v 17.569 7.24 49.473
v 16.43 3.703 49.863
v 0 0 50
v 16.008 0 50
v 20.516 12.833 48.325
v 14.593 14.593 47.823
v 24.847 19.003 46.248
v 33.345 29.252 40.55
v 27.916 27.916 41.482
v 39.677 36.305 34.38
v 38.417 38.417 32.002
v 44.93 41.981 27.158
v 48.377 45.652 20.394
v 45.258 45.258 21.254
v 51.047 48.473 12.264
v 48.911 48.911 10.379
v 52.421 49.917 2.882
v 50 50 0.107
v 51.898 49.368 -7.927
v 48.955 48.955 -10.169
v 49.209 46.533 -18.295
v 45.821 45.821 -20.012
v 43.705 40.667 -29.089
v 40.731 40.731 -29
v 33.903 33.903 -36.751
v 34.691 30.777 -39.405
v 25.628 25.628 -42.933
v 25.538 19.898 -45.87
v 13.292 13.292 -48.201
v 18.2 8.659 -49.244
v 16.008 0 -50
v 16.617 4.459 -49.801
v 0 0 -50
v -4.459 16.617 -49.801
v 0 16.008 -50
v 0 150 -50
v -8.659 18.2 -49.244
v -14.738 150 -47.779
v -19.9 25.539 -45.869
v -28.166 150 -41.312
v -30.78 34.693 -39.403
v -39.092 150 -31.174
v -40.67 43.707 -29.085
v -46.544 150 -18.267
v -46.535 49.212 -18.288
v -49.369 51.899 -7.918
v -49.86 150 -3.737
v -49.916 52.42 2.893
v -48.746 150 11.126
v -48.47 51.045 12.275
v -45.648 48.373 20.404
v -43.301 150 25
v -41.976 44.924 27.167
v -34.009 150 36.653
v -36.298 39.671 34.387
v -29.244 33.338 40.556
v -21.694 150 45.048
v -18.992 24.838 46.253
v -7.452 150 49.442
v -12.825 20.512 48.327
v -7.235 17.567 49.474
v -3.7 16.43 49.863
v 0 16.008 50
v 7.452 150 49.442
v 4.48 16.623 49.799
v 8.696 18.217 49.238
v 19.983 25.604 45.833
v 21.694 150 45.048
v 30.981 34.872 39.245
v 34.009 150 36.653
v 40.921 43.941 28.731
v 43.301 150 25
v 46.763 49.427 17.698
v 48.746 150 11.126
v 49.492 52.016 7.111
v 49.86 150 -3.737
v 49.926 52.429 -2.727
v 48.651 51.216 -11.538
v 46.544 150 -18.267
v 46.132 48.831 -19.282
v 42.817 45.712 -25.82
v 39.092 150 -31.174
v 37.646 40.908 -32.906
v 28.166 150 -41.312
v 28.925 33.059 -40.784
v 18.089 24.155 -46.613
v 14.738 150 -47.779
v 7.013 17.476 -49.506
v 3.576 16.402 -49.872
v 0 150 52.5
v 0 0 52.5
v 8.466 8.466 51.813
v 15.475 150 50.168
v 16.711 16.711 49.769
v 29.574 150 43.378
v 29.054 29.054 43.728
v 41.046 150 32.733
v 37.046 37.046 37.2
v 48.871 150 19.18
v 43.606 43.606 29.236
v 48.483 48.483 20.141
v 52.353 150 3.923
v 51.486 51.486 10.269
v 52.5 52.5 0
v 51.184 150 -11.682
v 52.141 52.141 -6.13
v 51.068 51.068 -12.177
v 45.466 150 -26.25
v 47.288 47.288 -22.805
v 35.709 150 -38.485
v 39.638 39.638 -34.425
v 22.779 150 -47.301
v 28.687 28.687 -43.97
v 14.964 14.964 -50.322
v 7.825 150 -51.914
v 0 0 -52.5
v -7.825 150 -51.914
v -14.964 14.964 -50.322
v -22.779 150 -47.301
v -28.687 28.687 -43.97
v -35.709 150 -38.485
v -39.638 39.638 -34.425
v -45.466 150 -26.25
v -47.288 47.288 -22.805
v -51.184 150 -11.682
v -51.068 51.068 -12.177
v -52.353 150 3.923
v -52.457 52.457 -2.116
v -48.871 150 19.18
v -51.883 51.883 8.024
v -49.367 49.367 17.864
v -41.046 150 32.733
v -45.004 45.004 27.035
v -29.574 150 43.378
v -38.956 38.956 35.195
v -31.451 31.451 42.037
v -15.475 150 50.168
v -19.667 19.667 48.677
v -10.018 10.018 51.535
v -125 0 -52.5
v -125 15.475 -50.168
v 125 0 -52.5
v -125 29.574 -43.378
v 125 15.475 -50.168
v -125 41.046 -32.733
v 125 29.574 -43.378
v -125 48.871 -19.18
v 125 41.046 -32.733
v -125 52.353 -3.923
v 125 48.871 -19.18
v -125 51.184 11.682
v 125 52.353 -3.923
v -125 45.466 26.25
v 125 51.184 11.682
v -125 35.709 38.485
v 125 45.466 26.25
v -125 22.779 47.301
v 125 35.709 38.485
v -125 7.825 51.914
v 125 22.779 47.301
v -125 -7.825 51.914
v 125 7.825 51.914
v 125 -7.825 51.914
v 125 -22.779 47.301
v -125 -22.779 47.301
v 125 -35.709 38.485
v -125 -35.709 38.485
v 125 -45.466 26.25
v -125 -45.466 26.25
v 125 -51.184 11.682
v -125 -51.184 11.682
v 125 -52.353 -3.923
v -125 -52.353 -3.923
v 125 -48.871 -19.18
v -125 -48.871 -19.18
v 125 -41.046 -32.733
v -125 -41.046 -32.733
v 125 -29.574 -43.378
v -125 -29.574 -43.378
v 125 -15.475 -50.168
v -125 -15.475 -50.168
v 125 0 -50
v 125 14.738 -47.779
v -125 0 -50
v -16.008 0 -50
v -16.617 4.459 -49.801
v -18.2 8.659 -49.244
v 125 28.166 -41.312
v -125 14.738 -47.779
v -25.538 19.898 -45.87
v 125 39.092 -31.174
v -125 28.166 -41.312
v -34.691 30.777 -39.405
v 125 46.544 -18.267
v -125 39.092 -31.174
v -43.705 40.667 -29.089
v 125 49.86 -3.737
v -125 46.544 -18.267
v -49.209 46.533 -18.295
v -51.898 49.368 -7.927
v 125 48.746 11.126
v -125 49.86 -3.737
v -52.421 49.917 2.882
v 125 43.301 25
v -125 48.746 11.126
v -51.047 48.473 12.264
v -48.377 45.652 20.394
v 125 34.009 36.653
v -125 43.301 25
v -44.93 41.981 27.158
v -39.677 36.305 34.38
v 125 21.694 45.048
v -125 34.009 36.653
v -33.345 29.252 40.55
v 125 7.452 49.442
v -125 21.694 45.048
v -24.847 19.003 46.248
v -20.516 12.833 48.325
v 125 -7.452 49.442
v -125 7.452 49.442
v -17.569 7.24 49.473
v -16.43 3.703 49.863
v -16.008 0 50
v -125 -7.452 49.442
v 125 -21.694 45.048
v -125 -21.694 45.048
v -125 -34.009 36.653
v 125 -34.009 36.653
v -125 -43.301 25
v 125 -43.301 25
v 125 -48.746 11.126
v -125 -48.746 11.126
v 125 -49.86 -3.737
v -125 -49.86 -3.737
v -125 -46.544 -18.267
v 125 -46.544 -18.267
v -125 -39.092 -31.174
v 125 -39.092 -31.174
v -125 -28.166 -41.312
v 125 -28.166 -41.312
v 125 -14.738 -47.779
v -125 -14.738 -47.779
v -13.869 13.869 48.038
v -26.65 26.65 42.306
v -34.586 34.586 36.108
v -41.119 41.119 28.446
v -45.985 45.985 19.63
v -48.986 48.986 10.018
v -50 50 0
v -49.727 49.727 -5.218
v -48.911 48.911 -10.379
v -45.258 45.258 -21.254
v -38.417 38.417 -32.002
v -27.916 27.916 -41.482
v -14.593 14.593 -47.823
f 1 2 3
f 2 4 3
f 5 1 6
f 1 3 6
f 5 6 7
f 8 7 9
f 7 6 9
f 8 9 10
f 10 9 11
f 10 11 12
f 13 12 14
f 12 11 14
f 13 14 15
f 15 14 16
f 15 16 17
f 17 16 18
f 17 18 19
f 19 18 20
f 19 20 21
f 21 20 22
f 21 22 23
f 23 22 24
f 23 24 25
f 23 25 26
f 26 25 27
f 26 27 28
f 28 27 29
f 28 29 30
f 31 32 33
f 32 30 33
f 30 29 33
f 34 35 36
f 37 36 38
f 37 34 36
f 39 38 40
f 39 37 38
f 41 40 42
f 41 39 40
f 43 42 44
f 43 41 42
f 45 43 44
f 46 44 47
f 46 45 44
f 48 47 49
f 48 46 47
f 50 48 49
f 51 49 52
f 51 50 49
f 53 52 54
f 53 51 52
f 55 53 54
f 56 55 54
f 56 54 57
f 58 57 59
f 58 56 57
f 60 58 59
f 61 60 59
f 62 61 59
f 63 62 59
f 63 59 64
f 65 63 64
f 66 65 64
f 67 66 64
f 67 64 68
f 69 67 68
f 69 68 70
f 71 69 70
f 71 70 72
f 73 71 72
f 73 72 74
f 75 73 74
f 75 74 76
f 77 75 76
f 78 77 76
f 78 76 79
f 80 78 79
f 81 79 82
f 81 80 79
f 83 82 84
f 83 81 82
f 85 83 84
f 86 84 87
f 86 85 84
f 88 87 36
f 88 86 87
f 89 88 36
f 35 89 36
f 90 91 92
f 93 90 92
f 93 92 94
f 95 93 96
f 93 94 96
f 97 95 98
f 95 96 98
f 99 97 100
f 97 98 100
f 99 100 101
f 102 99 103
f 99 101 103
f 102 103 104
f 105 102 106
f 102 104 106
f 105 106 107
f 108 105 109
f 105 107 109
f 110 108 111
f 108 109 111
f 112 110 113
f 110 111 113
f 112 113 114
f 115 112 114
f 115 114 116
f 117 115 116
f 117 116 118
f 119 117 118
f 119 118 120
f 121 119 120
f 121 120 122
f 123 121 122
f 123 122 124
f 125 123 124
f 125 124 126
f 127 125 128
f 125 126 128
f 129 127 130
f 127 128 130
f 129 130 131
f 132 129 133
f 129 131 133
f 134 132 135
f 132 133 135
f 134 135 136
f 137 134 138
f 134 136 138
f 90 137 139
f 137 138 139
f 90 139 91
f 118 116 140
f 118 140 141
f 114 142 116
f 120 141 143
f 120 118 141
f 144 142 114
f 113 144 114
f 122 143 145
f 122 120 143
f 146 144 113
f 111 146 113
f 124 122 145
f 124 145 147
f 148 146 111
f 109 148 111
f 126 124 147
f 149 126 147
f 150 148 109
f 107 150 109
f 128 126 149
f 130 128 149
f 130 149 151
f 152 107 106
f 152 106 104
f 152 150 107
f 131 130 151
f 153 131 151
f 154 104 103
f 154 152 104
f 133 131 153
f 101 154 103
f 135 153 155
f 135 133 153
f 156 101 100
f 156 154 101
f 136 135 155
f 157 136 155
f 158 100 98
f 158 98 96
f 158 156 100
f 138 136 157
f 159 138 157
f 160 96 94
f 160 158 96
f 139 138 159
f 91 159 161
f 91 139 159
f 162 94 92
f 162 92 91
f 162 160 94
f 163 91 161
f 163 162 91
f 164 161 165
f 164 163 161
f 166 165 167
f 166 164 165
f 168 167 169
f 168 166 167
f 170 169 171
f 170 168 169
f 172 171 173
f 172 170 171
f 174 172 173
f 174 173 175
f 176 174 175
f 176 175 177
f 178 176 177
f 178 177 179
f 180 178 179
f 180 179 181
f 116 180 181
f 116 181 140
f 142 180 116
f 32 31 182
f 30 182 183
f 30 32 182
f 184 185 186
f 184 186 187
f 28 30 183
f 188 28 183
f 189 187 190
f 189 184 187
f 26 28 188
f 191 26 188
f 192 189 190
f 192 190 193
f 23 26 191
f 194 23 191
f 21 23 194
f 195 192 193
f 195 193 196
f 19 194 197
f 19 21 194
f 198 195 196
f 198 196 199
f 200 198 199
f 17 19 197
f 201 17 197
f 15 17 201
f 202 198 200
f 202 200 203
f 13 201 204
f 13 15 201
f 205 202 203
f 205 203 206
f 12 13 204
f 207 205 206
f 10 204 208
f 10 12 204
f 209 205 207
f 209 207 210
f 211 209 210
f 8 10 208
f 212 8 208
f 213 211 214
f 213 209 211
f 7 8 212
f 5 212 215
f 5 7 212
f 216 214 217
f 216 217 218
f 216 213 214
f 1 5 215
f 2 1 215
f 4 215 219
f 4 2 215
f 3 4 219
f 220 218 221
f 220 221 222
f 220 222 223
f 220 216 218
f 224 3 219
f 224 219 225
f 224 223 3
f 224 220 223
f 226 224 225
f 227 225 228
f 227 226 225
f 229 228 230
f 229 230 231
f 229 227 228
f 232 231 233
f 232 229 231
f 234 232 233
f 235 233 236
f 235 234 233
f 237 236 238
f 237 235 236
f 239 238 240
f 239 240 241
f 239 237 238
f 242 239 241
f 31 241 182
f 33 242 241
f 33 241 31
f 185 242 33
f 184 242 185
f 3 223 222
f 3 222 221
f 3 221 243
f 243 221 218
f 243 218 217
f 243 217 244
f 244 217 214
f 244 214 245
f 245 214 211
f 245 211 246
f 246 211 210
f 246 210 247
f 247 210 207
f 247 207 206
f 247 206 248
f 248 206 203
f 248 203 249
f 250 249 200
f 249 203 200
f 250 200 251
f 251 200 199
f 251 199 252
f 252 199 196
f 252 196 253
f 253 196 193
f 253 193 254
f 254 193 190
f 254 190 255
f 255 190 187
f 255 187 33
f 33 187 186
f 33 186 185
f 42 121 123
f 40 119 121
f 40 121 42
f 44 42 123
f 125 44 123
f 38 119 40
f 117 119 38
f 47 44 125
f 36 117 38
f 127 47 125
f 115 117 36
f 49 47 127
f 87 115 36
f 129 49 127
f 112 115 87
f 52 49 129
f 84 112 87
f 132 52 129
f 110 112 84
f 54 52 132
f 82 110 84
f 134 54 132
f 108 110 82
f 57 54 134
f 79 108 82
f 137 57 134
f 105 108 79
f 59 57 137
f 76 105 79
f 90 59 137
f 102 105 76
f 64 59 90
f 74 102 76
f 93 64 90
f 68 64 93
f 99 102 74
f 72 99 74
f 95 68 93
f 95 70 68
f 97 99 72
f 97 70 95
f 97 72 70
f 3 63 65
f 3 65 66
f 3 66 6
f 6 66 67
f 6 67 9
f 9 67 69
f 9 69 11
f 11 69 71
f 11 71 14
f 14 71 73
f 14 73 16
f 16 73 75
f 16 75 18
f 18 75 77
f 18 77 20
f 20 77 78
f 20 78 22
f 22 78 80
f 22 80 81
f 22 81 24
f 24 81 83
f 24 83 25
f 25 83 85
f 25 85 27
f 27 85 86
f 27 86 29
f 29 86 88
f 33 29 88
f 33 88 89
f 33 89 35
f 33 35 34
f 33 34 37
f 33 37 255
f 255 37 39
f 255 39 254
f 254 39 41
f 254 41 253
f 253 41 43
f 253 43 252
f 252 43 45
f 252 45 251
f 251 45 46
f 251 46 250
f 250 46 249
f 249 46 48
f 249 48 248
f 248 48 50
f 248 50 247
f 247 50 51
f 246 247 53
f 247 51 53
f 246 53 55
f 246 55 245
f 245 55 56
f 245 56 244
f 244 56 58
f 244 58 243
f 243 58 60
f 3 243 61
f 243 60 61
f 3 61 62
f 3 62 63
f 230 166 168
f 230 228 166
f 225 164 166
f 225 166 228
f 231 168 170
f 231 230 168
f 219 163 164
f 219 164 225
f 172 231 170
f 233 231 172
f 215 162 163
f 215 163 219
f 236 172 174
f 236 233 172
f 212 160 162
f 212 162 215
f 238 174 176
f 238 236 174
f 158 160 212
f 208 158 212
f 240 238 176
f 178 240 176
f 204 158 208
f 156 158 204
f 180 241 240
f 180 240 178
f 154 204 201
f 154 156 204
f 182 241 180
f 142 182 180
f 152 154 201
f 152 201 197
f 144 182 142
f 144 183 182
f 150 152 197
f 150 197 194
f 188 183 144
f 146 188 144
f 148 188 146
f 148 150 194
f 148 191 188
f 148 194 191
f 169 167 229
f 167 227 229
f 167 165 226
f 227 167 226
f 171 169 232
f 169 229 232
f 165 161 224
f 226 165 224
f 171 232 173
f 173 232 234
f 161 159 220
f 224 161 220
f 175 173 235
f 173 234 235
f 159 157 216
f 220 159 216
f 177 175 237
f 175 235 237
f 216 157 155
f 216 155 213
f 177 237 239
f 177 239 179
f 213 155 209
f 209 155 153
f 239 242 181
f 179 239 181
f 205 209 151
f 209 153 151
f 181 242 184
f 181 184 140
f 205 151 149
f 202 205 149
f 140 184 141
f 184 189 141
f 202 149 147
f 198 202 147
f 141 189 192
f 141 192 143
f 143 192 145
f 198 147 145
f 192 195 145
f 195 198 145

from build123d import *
from build123d.topology import SkipClean

# Parameters (mm, degrees)
SKETCH1_R           = 52.5
SKETCH1_R_2         = 50
BOSS_EXTRUDE1_DEPTH = 125
SKETCH2_R           = 52.5
SKETCH2_R_2         = 50
BOSS_EXTRUDE2_DEPTH = 150
CUT_EXTRUDE1_REACH  = 245.696
SKETCH3_R           = 50
SKETCH6_R           = 50
CUT_EXTRUDE2_DEPTH  = 297.236814188


with BuildPart() as part:
    # Sketch1 → Boss-Extrude1 (new, symmetric)
    with BuildSketch(Plane(origin=(0, 0, 0), x_dir=(0, 0, -1), z_dir=(1, 0, 0))):
        Circle(SKETCH1_R)
        Circle(SKETCH1_R_2, mode=Mode.SUBTRACT)
    extrude(amount=BOSS_EXTRUDE1_DEPTH, both=True)

    # Sketch2 → Boss-Extrude2 (add)
    with BuildSketch(Plane(origin=(0, 0, 0), x_dir=(1, 0, 0), z_dir=(0, 1, 0))):
        with Locations(Location((0, 0, 0), (0, 0, 270))):
            Circle(SKETCH2_R)
        with Locations(Location((0, 0, 0), (0, 0, 90))):
            Circle(SKETCH2_R_2, mode=Mode.SUBTRACT)
    extrude(amount=BOSS_EXTRUDE2_DEPTH)

    # Sketch3 → Cut-Extrude1 (cut, up to next)
    with BuildSketch(Plane(origin=(0, 150, 0), x_dir=(1, 0, 0), z_dir=(0, 1, 0)), mode=Mode.PRIVATE) as cut_extrude1_sk1:
        with Locations(Location((0, 0, 0), (0, 0, 270))):
            Circle(SKETCH3_R)
    cut_extrude1_tool1 = extrude(cut_extrude1_sk1.sketch, amount=-CUT_EXTRUDE1_REACH, mode=Mode.PRIVATE) & part.part
    add(cut_extrude1_tool1.solids().sort_by_distance((0, 150, 0))[0], mode=Mode.SUBTRACT)

    # Sketch6 → Cut-Extrude2 (cut, through all)
    with SkipClean():  # the faces are left unmerged after this step: merging them gives an invalid solid
        with BuildSketch(Plane.ZY.offset(125)):
            with Locations(Location((0, 0, 0), (0, 0, 180))):
                Circle(SKETCH6_R)
        extrude(amount=-CUT_EXTRUDE2_DEPTH, mode=Mode.SUBTRACT)


solid = part.part
